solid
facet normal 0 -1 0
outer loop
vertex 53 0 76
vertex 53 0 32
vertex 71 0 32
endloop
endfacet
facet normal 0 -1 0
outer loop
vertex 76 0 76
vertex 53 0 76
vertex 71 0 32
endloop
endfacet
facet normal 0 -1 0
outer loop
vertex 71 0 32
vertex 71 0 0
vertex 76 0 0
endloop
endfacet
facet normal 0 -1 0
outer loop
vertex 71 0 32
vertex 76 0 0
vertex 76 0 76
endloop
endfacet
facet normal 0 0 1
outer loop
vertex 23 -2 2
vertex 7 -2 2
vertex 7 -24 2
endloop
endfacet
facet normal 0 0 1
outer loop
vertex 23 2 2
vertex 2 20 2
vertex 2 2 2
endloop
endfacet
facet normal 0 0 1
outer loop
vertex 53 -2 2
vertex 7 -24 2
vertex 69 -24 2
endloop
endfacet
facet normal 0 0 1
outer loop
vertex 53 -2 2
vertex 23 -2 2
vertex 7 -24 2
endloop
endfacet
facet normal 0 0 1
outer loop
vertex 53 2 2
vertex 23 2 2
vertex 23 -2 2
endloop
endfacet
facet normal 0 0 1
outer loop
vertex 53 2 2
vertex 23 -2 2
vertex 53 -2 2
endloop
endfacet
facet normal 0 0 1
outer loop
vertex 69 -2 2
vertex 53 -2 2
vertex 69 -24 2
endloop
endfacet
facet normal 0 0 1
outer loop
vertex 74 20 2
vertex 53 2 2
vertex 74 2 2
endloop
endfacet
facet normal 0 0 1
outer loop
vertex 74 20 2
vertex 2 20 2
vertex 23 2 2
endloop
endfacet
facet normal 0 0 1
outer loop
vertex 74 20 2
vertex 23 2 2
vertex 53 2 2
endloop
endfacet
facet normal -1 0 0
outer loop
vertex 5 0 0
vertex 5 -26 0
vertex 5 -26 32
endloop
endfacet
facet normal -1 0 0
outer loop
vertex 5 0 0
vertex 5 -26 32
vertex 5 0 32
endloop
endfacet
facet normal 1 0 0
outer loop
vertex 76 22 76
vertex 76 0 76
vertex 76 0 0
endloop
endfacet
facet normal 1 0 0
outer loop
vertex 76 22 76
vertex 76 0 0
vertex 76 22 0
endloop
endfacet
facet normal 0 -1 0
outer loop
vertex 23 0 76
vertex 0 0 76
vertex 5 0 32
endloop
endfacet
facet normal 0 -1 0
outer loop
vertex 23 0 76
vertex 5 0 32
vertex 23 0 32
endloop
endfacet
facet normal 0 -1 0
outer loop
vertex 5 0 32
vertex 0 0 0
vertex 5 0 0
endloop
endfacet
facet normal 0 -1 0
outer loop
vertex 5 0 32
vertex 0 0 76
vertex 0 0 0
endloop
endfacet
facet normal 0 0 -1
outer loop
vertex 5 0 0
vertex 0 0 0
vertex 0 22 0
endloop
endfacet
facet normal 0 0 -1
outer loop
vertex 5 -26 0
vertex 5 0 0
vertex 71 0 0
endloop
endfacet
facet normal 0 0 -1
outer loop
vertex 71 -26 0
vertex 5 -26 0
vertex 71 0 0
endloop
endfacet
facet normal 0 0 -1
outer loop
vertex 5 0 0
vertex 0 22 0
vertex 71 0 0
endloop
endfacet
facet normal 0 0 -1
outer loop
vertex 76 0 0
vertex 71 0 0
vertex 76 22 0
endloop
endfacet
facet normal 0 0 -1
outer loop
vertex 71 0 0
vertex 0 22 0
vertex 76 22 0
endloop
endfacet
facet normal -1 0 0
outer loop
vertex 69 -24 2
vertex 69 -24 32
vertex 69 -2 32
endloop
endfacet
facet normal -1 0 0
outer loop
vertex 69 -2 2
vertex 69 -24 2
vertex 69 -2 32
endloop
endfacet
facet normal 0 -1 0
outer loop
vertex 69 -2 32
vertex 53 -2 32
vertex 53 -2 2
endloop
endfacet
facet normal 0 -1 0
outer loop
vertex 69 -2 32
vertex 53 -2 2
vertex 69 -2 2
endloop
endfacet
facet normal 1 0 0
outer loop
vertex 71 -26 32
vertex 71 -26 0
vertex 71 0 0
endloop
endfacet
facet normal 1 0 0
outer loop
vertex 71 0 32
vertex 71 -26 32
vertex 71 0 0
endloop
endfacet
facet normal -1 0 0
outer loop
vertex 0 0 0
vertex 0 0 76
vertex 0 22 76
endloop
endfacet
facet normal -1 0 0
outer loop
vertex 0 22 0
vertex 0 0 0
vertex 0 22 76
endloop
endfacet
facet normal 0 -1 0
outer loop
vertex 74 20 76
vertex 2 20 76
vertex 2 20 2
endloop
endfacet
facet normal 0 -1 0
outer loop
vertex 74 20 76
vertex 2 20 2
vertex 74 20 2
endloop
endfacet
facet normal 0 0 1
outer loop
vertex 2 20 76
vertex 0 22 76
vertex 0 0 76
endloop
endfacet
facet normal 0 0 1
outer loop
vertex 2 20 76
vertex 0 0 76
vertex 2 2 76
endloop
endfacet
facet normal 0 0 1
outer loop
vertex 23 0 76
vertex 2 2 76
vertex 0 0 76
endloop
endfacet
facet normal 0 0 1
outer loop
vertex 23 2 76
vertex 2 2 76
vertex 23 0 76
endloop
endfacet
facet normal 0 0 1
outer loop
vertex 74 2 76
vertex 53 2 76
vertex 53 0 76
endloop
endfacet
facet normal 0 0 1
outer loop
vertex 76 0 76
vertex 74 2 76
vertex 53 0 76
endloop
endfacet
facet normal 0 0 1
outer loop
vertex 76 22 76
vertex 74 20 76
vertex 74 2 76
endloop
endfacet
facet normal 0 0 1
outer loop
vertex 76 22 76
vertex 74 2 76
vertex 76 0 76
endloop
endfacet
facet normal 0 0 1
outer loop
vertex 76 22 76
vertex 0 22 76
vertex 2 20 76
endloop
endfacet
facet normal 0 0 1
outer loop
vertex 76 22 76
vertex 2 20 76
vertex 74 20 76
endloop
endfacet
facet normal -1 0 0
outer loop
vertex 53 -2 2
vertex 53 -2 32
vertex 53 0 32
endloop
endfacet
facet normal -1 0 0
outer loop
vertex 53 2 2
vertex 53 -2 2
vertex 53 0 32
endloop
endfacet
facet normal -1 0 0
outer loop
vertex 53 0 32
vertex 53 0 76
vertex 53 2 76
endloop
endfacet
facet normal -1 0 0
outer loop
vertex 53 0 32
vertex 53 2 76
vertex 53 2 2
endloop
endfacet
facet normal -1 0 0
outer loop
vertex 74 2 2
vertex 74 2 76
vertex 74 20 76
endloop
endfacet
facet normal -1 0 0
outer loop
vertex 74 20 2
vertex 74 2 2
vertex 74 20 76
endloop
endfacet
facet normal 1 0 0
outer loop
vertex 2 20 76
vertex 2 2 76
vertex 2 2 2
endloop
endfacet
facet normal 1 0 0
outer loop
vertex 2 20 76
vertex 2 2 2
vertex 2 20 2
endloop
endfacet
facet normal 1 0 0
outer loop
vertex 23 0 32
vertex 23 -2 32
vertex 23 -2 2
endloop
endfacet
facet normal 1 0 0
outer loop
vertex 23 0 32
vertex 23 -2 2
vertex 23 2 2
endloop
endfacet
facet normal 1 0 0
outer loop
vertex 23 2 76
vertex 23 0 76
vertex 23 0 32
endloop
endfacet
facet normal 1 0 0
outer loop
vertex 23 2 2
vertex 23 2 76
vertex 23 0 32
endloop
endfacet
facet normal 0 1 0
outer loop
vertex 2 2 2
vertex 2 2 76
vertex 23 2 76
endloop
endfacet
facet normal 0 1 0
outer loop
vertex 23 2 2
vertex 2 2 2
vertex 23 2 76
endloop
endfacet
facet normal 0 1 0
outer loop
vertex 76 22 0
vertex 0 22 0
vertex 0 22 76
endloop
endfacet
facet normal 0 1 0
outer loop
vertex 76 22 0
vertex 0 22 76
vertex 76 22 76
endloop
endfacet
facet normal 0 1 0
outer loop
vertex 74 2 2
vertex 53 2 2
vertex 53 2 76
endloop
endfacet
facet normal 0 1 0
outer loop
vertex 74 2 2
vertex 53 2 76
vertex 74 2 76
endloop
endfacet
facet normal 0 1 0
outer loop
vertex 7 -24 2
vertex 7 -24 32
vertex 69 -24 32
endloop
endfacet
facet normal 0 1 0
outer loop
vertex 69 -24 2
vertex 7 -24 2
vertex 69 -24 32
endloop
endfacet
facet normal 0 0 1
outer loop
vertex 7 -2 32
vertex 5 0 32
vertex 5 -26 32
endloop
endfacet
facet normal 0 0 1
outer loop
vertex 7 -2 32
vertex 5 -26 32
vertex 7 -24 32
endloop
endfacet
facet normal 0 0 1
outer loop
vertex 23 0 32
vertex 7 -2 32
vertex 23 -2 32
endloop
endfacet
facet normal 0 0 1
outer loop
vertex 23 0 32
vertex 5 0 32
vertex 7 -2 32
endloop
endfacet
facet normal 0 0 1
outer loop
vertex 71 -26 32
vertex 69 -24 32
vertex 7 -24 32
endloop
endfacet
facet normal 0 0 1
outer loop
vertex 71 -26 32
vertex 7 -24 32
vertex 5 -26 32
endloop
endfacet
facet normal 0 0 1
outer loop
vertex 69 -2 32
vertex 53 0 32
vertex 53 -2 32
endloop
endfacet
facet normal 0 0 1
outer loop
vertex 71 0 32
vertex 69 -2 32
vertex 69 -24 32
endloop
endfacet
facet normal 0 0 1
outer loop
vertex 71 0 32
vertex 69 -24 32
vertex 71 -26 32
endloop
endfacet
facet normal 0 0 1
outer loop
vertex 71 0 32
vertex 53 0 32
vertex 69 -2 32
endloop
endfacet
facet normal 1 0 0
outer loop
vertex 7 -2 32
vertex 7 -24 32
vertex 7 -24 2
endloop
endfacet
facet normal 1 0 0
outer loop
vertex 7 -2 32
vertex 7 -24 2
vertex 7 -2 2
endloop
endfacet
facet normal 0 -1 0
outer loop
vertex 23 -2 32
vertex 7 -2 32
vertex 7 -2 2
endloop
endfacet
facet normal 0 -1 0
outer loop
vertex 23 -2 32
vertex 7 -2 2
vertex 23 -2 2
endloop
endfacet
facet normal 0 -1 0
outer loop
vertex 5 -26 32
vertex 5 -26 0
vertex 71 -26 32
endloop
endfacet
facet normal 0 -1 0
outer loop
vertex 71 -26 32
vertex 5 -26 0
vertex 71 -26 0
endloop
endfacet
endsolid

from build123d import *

# Parameters (mm, degrees)
SKETCH_W        = 76
SKETCH_H        = 22
PAD_DEPTH       = 76
SKETCH001_W     = 66
SKETCH001_H     = 26
PAD001_DEPTH    = 32
SKETCH002_W     = 62
SKETCH002_H     = 22
POCKET_DEPTH    = 30
SKETCH003_W     = 72
SKETCH003_H     = 18
POCKET001_DEPTH = 74
SKETCH004_W     = 30
SKETCH004_H     = 2
POCKET002_DEPTH = 30
SKETCH005_W     = 30
SKETCH005_H     = 2
POCKET003_DEPTH = 74


with BuildPart() as part:
    # Sketch → Pad (new body)
    with BuildSketch(Plane.XY):
        with Locations((38, 11)):
            Rectangle(SKETCH_W, SKETCH_H)
    extrude(amount=PAD_DEPTH)

    # Sketch001 → Pad001 (join)
    with BuildSketch(Plane.XY):
        with Locations((38, -13)):
            Rectangle(SKETCH001_W, SKETCH001_H)
    extrude(amount=PAD001_DEPTH)

    # Sketch002 (on Face4 of Pad001) → Pocket (cut)
    with BuildSketch(Plane.XY.offset(32)):
        with Locations((38, -13)):
            Rectangle(SKETCH002_W, SKETCH002_H)
    extrude(amount=-POCKET_DEPTH, mode=Mode.SUBTRACT)

    # Sketch003 (on Face7 of Pocket) → Pocket001 (cut)
    with BuildSketch(Plane.XY.offset(76)):
        with Locations((38, 11)):
            Rectangle(SKETCH003_W, SKETCH003_H)
    extrude(amount=-POCKET001_DEPTH, mode=Mode.SUBTRACT)

    # Sketch004 (on Face4 of Pocket001) → Pocket002 (cut)
    with BuildSketch(Plane.XY.offset(32)):
        with Locations((38, -1)):
            Rectangle(SKETCH004_W, SKETCH004_H)
    extrude(amount=-POCKET002_DEPTH, mode=Mode.SUBTRACT)

    # Sketch005 (on Face8 of Pocket002) → Pocket003 (cut)
    with BuildSketch(Plane.XY.offset(76)):
        with Locations((38, 1)):
            Rectangle(SKETCH005_W, SKETCH005_H)
    extrude(amount=-POCKET003_DEPTH, mode=Mode.SUBTRACT)


solid = part.part
